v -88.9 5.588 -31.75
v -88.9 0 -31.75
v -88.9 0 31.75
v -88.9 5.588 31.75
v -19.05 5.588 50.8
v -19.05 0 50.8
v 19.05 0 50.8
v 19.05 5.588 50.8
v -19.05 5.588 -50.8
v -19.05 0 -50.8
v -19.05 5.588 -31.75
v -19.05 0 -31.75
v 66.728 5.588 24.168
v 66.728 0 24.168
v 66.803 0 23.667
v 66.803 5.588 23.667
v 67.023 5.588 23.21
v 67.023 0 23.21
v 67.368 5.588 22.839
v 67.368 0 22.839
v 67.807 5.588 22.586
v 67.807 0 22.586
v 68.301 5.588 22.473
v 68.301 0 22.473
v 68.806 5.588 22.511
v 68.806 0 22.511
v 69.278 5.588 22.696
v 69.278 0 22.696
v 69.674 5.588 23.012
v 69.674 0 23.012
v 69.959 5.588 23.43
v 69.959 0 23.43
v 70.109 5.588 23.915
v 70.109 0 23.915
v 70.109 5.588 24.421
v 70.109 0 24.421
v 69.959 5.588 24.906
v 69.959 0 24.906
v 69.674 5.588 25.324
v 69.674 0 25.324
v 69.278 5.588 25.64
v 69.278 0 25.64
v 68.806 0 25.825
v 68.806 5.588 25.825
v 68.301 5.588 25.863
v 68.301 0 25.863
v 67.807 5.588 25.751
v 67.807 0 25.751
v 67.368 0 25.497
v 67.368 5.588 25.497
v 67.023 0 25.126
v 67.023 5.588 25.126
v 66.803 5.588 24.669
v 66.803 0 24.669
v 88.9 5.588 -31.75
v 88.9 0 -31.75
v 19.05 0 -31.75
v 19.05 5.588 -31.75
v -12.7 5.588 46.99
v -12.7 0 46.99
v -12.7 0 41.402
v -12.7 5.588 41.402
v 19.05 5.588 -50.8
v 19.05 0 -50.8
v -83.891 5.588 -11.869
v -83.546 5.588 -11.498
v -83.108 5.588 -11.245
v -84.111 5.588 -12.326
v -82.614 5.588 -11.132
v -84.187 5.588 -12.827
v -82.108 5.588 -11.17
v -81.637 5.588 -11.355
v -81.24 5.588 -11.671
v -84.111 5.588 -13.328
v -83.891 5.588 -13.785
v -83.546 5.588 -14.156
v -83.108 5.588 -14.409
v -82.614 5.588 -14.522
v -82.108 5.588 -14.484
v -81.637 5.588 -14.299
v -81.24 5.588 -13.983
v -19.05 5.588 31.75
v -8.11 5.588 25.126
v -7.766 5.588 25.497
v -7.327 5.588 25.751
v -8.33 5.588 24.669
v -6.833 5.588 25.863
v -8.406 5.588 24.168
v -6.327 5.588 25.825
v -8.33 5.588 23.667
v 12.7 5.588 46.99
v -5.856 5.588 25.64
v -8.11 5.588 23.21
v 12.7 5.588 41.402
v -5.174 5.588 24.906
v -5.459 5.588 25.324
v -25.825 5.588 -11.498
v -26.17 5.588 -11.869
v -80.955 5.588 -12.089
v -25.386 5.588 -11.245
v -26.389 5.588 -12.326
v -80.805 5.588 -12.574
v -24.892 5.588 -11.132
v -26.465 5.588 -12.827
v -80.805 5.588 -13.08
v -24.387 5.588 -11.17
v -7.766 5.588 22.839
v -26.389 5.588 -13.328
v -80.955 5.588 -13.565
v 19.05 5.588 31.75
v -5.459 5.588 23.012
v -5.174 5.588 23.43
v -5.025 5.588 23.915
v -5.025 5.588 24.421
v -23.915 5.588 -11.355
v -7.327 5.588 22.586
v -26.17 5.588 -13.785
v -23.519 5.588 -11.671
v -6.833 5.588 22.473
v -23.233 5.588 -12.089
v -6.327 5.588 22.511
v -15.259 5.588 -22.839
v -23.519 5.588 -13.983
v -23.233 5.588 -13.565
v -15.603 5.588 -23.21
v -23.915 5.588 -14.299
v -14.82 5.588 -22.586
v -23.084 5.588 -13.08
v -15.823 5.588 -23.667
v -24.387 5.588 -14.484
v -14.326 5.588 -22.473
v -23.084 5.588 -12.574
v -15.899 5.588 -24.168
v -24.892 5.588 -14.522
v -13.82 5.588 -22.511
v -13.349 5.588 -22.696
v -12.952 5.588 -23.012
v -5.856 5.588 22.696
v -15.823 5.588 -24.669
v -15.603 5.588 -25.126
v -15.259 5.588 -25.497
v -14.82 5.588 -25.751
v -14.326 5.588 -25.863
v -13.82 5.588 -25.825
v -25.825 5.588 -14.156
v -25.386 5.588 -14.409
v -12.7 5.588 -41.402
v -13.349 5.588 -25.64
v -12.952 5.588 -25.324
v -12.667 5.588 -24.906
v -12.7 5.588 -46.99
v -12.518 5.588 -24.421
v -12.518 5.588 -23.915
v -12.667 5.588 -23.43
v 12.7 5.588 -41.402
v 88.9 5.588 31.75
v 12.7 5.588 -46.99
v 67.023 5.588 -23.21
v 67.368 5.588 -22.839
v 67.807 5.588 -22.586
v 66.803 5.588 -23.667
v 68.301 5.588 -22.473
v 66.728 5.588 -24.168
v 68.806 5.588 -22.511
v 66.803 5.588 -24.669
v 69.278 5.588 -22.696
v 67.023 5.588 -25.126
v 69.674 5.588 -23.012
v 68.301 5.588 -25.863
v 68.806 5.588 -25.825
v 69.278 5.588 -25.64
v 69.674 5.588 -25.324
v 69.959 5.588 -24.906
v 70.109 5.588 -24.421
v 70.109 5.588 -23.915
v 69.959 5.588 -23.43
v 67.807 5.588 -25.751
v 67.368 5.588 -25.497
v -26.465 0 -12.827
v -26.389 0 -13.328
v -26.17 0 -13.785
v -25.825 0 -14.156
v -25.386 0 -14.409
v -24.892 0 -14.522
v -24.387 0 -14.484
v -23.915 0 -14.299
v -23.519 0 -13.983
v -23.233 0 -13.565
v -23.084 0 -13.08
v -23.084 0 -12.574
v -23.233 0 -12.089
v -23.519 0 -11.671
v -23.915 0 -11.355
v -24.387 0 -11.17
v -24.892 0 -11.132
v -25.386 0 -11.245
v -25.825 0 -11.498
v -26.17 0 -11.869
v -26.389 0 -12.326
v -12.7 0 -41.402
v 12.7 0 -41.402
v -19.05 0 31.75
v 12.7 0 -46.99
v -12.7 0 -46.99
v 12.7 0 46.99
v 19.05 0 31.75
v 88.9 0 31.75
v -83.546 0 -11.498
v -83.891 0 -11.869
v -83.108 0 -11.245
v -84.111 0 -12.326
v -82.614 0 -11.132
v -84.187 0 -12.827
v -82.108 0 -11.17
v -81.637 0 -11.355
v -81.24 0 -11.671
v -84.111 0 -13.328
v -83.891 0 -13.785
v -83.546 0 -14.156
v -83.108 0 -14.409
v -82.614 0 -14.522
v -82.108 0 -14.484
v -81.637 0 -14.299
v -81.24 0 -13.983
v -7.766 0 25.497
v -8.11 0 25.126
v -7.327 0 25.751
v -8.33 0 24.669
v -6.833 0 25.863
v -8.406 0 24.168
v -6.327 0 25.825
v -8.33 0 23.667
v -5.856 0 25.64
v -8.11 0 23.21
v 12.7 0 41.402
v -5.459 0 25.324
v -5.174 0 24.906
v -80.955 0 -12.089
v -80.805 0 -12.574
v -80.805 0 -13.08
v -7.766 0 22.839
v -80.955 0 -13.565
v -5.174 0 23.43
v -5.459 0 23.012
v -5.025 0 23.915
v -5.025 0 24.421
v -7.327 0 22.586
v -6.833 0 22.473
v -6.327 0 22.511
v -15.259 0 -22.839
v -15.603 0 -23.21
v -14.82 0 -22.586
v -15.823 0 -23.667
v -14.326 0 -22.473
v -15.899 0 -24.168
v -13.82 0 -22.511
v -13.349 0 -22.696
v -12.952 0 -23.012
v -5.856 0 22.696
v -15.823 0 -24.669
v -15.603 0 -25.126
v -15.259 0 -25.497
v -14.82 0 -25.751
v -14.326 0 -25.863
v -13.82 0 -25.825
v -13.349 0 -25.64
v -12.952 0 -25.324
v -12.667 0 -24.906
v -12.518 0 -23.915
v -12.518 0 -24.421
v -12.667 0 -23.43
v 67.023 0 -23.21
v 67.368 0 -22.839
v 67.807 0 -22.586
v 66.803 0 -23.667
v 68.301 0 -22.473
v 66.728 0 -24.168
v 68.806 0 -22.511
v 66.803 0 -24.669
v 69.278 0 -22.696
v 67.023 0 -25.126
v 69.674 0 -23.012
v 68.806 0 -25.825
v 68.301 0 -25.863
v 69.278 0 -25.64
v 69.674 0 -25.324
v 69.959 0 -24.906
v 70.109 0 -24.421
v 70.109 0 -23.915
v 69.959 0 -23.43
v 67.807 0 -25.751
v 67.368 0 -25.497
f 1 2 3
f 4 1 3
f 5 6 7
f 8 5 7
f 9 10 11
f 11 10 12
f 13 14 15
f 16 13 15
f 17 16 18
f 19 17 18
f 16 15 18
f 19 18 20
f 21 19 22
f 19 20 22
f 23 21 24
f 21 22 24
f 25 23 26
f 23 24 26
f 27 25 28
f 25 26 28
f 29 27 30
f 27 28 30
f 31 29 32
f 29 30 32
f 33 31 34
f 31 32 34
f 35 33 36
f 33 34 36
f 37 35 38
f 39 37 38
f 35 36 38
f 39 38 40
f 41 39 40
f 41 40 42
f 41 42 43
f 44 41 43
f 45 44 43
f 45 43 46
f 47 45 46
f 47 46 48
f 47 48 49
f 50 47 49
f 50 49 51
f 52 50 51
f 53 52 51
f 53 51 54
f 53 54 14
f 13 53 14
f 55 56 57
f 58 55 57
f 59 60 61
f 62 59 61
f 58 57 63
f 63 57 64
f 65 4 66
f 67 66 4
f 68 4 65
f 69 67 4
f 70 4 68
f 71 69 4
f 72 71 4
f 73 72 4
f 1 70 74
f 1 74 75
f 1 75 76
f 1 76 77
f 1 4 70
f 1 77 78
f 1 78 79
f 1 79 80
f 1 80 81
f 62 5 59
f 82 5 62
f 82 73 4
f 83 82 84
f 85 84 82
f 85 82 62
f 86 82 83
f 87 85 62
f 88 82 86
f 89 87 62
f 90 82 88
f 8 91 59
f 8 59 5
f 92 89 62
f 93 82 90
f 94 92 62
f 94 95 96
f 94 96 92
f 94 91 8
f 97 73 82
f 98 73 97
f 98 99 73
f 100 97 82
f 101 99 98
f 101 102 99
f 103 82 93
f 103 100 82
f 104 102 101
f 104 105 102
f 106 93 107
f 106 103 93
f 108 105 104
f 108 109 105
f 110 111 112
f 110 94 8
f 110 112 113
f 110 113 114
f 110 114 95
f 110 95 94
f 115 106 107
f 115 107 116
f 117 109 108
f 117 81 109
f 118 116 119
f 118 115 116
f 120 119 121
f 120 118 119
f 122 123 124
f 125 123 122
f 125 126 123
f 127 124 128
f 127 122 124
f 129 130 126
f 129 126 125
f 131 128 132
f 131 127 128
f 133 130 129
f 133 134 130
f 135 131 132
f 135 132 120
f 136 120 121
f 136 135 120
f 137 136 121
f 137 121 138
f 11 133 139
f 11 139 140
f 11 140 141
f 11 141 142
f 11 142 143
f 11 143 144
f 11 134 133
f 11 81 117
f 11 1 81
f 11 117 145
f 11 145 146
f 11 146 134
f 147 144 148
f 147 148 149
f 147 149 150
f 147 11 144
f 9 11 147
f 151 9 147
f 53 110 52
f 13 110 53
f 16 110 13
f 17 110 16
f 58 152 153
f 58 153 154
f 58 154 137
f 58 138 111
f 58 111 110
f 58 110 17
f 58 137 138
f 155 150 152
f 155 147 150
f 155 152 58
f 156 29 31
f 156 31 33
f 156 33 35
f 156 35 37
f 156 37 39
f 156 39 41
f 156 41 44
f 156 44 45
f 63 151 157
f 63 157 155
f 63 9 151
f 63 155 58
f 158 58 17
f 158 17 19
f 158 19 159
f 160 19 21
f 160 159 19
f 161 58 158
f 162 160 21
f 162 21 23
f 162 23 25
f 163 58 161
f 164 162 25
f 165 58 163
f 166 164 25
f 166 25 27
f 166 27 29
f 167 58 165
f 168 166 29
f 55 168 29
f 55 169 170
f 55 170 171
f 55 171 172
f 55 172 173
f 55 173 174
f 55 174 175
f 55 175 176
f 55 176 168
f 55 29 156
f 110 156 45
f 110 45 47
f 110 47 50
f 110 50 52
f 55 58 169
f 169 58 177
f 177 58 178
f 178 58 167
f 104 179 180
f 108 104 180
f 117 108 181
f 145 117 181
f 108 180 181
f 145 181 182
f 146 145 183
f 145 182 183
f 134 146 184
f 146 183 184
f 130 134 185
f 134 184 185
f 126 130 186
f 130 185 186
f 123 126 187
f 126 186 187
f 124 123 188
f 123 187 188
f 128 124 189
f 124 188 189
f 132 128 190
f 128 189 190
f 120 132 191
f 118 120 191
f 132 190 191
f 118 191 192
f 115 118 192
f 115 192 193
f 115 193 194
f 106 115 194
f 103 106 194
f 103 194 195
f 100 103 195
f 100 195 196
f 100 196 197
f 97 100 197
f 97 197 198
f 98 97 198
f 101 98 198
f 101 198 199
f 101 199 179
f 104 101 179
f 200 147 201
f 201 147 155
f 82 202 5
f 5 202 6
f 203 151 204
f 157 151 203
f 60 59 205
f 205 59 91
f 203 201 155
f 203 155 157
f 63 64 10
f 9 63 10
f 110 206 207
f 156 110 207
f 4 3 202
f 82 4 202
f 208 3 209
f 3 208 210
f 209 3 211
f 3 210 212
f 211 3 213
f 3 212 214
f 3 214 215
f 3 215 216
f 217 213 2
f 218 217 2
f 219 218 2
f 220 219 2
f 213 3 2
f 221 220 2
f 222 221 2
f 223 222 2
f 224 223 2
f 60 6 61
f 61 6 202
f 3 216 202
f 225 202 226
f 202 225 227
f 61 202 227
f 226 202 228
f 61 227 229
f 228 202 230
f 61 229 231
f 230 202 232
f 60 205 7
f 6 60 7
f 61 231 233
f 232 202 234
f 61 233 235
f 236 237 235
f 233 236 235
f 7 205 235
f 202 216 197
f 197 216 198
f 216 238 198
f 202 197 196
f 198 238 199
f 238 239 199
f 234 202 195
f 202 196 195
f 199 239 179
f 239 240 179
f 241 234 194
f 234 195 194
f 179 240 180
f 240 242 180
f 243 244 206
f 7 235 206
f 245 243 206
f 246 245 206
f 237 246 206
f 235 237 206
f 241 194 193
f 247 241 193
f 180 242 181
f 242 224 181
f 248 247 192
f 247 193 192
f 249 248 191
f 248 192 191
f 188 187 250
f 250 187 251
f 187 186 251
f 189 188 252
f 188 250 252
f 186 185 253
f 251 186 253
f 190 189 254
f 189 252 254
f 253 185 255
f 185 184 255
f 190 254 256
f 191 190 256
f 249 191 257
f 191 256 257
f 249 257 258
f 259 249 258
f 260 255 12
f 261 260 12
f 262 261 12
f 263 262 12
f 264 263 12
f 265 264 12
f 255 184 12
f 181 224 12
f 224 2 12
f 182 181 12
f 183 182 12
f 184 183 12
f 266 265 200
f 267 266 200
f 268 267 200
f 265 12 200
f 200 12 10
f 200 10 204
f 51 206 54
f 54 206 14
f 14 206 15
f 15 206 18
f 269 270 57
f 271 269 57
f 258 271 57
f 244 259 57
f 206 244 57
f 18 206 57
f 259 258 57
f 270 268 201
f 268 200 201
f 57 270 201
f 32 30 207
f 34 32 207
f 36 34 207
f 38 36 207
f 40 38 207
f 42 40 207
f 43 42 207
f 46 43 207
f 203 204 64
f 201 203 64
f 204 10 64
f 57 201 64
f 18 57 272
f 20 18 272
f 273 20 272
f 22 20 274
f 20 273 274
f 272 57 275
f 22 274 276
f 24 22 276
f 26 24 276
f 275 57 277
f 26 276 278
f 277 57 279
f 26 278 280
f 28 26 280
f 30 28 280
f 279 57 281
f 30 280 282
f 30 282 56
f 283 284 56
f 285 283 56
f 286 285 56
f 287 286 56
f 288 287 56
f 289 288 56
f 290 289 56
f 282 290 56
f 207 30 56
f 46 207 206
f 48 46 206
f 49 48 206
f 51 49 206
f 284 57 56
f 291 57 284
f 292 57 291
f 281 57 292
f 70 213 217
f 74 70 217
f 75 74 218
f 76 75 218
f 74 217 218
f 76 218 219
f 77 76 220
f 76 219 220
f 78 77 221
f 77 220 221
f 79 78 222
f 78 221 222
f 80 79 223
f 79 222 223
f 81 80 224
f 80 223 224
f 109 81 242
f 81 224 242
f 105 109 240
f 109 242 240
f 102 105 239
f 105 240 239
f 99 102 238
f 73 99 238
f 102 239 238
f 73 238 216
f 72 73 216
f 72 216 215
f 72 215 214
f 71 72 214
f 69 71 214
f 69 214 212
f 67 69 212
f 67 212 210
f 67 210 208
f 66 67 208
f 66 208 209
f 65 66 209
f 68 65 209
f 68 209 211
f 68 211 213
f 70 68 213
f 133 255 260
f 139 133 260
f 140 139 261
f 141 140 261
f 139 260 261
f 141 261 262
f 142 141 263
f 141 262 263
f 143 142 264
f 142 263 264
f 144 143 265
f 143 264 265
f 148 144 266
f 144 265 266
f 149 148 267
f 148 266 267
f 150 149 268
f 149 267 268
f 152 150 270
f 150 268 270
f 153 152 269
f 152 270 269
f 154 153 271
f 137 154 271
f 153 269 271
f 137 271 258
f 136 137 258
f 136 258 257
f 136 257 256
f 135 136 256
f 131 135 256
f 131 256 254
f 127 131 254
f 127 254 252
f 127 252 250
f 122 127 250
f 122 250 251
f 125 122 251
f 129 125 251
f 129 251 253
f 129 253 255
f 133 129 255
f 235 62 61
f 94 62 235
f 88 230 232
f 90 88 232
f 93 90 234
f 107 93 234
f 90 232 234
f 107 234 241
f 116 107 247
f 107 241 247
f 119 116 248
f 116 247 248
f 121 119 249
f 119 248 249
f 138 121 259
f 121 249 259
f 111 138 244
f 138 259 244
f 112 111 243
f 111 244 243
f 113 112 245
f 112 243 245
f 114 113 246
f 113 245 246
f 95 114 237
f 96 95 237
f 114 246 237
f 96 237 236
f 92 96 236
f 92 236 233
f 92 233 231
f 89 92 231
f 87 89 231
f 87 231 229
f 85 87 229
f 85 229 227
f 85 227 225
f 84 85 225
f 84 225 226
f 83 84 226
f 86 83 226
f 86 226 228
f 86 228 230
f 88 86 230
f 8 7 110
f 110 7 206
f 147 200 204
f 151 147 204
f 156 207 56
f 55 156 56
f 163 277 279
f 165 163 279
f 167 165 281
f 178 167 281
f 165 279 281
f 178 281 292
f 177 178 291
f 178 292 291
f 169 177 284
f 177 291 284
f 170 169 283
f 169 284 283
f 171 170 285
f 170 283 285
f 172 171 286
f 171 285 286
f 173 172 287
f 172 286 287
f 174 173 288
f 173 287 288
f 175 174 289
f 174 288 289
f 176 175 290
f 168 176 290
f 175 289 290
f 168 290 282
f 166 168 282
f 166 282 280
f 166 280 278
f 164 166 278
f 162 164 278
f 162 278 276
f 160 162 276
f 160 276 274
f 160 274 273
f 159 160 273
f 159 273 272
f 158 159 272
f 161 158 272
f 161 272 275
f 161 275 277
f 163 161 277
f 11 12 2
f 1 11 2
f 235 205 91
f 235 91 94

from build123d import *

# Parameters (mm, degrees)
BOSS_EXTRUDE1_DEPTH  = 5.588
SKETCH2_W            = 25.4
SKETCH2_H            = 5.588
CUT_EXTRUDE1_DEPTH   = 103.543043372
M3_CLEARANCE_HOLE1_D = 3.4
M3_CLEARANCE_HOLE2_D = 3.4


with BuildPart() as part:
    # Sketch1 → Boss-Extrude1 (new body)
    with BuildSketch(Plane(origin=(0, 0, 0), x_dir=(1, 0, 0), z_dir=(0, 1, 0))):
        Polygon((19.05, 31.75), (19.05, 50.8), (-19.05, 50.8), (-19.05, 31.75), (-88.9, 31.75), (-88.9, -31.75), (-19.05, -31.75), (-19.05, -50.8), (19.05, -50.8), (19.05, -31.75), (88.9, -31.75), (88.9, 31.75), align=None)
    extrude(amount=BOSS_EXTRUDE1_DEPTH)

    # Sketch2 → Cut-Extrude1 (cut, through all)
    with BuildSketch(Plane(origin=(0, 5.588, 0), x_dir=(1, 0, 0), z_dir=(0, 1, 0))):
        with Locations((0, 44.196)):
            Rectangle(SKETCH2_W, SKETCH2_H)
        with Locations((0, -44.196)):
            Rectangle(SKETCH2_W, SKETCH2_H)
    extrude(amount=-CUT_EXTRUDE1_DEPTH, mode=Mode.SUBTRACT)

    # M3 Clearance Hole1 (through all)
    with Locations(Plane(origin=(0, 5.588, 0), x_dir=(1, 0, 0), z_dir=(0, 1, 0))):
        with Locations((-14.1986, 24.1681), (68.4276, 24.1681), (68.4276, -24.1681), (-6.7056, -24.1681)):
            Hole(M3_CLEARANCE_HOLE1_D / 2)

    # M3 Clearance Hole2 (through all)
    with Locations(Plane(origin=(0, 5.588, 0), x_dir=(1, 0, 0), z_dir=(0, 1, 0))):
        with Locations((-24.765, 12.827), (-82.4865, 12.827)):
            Hole(M3_CLEARANCE_HOLE2_D / 2)


solid = part.part
